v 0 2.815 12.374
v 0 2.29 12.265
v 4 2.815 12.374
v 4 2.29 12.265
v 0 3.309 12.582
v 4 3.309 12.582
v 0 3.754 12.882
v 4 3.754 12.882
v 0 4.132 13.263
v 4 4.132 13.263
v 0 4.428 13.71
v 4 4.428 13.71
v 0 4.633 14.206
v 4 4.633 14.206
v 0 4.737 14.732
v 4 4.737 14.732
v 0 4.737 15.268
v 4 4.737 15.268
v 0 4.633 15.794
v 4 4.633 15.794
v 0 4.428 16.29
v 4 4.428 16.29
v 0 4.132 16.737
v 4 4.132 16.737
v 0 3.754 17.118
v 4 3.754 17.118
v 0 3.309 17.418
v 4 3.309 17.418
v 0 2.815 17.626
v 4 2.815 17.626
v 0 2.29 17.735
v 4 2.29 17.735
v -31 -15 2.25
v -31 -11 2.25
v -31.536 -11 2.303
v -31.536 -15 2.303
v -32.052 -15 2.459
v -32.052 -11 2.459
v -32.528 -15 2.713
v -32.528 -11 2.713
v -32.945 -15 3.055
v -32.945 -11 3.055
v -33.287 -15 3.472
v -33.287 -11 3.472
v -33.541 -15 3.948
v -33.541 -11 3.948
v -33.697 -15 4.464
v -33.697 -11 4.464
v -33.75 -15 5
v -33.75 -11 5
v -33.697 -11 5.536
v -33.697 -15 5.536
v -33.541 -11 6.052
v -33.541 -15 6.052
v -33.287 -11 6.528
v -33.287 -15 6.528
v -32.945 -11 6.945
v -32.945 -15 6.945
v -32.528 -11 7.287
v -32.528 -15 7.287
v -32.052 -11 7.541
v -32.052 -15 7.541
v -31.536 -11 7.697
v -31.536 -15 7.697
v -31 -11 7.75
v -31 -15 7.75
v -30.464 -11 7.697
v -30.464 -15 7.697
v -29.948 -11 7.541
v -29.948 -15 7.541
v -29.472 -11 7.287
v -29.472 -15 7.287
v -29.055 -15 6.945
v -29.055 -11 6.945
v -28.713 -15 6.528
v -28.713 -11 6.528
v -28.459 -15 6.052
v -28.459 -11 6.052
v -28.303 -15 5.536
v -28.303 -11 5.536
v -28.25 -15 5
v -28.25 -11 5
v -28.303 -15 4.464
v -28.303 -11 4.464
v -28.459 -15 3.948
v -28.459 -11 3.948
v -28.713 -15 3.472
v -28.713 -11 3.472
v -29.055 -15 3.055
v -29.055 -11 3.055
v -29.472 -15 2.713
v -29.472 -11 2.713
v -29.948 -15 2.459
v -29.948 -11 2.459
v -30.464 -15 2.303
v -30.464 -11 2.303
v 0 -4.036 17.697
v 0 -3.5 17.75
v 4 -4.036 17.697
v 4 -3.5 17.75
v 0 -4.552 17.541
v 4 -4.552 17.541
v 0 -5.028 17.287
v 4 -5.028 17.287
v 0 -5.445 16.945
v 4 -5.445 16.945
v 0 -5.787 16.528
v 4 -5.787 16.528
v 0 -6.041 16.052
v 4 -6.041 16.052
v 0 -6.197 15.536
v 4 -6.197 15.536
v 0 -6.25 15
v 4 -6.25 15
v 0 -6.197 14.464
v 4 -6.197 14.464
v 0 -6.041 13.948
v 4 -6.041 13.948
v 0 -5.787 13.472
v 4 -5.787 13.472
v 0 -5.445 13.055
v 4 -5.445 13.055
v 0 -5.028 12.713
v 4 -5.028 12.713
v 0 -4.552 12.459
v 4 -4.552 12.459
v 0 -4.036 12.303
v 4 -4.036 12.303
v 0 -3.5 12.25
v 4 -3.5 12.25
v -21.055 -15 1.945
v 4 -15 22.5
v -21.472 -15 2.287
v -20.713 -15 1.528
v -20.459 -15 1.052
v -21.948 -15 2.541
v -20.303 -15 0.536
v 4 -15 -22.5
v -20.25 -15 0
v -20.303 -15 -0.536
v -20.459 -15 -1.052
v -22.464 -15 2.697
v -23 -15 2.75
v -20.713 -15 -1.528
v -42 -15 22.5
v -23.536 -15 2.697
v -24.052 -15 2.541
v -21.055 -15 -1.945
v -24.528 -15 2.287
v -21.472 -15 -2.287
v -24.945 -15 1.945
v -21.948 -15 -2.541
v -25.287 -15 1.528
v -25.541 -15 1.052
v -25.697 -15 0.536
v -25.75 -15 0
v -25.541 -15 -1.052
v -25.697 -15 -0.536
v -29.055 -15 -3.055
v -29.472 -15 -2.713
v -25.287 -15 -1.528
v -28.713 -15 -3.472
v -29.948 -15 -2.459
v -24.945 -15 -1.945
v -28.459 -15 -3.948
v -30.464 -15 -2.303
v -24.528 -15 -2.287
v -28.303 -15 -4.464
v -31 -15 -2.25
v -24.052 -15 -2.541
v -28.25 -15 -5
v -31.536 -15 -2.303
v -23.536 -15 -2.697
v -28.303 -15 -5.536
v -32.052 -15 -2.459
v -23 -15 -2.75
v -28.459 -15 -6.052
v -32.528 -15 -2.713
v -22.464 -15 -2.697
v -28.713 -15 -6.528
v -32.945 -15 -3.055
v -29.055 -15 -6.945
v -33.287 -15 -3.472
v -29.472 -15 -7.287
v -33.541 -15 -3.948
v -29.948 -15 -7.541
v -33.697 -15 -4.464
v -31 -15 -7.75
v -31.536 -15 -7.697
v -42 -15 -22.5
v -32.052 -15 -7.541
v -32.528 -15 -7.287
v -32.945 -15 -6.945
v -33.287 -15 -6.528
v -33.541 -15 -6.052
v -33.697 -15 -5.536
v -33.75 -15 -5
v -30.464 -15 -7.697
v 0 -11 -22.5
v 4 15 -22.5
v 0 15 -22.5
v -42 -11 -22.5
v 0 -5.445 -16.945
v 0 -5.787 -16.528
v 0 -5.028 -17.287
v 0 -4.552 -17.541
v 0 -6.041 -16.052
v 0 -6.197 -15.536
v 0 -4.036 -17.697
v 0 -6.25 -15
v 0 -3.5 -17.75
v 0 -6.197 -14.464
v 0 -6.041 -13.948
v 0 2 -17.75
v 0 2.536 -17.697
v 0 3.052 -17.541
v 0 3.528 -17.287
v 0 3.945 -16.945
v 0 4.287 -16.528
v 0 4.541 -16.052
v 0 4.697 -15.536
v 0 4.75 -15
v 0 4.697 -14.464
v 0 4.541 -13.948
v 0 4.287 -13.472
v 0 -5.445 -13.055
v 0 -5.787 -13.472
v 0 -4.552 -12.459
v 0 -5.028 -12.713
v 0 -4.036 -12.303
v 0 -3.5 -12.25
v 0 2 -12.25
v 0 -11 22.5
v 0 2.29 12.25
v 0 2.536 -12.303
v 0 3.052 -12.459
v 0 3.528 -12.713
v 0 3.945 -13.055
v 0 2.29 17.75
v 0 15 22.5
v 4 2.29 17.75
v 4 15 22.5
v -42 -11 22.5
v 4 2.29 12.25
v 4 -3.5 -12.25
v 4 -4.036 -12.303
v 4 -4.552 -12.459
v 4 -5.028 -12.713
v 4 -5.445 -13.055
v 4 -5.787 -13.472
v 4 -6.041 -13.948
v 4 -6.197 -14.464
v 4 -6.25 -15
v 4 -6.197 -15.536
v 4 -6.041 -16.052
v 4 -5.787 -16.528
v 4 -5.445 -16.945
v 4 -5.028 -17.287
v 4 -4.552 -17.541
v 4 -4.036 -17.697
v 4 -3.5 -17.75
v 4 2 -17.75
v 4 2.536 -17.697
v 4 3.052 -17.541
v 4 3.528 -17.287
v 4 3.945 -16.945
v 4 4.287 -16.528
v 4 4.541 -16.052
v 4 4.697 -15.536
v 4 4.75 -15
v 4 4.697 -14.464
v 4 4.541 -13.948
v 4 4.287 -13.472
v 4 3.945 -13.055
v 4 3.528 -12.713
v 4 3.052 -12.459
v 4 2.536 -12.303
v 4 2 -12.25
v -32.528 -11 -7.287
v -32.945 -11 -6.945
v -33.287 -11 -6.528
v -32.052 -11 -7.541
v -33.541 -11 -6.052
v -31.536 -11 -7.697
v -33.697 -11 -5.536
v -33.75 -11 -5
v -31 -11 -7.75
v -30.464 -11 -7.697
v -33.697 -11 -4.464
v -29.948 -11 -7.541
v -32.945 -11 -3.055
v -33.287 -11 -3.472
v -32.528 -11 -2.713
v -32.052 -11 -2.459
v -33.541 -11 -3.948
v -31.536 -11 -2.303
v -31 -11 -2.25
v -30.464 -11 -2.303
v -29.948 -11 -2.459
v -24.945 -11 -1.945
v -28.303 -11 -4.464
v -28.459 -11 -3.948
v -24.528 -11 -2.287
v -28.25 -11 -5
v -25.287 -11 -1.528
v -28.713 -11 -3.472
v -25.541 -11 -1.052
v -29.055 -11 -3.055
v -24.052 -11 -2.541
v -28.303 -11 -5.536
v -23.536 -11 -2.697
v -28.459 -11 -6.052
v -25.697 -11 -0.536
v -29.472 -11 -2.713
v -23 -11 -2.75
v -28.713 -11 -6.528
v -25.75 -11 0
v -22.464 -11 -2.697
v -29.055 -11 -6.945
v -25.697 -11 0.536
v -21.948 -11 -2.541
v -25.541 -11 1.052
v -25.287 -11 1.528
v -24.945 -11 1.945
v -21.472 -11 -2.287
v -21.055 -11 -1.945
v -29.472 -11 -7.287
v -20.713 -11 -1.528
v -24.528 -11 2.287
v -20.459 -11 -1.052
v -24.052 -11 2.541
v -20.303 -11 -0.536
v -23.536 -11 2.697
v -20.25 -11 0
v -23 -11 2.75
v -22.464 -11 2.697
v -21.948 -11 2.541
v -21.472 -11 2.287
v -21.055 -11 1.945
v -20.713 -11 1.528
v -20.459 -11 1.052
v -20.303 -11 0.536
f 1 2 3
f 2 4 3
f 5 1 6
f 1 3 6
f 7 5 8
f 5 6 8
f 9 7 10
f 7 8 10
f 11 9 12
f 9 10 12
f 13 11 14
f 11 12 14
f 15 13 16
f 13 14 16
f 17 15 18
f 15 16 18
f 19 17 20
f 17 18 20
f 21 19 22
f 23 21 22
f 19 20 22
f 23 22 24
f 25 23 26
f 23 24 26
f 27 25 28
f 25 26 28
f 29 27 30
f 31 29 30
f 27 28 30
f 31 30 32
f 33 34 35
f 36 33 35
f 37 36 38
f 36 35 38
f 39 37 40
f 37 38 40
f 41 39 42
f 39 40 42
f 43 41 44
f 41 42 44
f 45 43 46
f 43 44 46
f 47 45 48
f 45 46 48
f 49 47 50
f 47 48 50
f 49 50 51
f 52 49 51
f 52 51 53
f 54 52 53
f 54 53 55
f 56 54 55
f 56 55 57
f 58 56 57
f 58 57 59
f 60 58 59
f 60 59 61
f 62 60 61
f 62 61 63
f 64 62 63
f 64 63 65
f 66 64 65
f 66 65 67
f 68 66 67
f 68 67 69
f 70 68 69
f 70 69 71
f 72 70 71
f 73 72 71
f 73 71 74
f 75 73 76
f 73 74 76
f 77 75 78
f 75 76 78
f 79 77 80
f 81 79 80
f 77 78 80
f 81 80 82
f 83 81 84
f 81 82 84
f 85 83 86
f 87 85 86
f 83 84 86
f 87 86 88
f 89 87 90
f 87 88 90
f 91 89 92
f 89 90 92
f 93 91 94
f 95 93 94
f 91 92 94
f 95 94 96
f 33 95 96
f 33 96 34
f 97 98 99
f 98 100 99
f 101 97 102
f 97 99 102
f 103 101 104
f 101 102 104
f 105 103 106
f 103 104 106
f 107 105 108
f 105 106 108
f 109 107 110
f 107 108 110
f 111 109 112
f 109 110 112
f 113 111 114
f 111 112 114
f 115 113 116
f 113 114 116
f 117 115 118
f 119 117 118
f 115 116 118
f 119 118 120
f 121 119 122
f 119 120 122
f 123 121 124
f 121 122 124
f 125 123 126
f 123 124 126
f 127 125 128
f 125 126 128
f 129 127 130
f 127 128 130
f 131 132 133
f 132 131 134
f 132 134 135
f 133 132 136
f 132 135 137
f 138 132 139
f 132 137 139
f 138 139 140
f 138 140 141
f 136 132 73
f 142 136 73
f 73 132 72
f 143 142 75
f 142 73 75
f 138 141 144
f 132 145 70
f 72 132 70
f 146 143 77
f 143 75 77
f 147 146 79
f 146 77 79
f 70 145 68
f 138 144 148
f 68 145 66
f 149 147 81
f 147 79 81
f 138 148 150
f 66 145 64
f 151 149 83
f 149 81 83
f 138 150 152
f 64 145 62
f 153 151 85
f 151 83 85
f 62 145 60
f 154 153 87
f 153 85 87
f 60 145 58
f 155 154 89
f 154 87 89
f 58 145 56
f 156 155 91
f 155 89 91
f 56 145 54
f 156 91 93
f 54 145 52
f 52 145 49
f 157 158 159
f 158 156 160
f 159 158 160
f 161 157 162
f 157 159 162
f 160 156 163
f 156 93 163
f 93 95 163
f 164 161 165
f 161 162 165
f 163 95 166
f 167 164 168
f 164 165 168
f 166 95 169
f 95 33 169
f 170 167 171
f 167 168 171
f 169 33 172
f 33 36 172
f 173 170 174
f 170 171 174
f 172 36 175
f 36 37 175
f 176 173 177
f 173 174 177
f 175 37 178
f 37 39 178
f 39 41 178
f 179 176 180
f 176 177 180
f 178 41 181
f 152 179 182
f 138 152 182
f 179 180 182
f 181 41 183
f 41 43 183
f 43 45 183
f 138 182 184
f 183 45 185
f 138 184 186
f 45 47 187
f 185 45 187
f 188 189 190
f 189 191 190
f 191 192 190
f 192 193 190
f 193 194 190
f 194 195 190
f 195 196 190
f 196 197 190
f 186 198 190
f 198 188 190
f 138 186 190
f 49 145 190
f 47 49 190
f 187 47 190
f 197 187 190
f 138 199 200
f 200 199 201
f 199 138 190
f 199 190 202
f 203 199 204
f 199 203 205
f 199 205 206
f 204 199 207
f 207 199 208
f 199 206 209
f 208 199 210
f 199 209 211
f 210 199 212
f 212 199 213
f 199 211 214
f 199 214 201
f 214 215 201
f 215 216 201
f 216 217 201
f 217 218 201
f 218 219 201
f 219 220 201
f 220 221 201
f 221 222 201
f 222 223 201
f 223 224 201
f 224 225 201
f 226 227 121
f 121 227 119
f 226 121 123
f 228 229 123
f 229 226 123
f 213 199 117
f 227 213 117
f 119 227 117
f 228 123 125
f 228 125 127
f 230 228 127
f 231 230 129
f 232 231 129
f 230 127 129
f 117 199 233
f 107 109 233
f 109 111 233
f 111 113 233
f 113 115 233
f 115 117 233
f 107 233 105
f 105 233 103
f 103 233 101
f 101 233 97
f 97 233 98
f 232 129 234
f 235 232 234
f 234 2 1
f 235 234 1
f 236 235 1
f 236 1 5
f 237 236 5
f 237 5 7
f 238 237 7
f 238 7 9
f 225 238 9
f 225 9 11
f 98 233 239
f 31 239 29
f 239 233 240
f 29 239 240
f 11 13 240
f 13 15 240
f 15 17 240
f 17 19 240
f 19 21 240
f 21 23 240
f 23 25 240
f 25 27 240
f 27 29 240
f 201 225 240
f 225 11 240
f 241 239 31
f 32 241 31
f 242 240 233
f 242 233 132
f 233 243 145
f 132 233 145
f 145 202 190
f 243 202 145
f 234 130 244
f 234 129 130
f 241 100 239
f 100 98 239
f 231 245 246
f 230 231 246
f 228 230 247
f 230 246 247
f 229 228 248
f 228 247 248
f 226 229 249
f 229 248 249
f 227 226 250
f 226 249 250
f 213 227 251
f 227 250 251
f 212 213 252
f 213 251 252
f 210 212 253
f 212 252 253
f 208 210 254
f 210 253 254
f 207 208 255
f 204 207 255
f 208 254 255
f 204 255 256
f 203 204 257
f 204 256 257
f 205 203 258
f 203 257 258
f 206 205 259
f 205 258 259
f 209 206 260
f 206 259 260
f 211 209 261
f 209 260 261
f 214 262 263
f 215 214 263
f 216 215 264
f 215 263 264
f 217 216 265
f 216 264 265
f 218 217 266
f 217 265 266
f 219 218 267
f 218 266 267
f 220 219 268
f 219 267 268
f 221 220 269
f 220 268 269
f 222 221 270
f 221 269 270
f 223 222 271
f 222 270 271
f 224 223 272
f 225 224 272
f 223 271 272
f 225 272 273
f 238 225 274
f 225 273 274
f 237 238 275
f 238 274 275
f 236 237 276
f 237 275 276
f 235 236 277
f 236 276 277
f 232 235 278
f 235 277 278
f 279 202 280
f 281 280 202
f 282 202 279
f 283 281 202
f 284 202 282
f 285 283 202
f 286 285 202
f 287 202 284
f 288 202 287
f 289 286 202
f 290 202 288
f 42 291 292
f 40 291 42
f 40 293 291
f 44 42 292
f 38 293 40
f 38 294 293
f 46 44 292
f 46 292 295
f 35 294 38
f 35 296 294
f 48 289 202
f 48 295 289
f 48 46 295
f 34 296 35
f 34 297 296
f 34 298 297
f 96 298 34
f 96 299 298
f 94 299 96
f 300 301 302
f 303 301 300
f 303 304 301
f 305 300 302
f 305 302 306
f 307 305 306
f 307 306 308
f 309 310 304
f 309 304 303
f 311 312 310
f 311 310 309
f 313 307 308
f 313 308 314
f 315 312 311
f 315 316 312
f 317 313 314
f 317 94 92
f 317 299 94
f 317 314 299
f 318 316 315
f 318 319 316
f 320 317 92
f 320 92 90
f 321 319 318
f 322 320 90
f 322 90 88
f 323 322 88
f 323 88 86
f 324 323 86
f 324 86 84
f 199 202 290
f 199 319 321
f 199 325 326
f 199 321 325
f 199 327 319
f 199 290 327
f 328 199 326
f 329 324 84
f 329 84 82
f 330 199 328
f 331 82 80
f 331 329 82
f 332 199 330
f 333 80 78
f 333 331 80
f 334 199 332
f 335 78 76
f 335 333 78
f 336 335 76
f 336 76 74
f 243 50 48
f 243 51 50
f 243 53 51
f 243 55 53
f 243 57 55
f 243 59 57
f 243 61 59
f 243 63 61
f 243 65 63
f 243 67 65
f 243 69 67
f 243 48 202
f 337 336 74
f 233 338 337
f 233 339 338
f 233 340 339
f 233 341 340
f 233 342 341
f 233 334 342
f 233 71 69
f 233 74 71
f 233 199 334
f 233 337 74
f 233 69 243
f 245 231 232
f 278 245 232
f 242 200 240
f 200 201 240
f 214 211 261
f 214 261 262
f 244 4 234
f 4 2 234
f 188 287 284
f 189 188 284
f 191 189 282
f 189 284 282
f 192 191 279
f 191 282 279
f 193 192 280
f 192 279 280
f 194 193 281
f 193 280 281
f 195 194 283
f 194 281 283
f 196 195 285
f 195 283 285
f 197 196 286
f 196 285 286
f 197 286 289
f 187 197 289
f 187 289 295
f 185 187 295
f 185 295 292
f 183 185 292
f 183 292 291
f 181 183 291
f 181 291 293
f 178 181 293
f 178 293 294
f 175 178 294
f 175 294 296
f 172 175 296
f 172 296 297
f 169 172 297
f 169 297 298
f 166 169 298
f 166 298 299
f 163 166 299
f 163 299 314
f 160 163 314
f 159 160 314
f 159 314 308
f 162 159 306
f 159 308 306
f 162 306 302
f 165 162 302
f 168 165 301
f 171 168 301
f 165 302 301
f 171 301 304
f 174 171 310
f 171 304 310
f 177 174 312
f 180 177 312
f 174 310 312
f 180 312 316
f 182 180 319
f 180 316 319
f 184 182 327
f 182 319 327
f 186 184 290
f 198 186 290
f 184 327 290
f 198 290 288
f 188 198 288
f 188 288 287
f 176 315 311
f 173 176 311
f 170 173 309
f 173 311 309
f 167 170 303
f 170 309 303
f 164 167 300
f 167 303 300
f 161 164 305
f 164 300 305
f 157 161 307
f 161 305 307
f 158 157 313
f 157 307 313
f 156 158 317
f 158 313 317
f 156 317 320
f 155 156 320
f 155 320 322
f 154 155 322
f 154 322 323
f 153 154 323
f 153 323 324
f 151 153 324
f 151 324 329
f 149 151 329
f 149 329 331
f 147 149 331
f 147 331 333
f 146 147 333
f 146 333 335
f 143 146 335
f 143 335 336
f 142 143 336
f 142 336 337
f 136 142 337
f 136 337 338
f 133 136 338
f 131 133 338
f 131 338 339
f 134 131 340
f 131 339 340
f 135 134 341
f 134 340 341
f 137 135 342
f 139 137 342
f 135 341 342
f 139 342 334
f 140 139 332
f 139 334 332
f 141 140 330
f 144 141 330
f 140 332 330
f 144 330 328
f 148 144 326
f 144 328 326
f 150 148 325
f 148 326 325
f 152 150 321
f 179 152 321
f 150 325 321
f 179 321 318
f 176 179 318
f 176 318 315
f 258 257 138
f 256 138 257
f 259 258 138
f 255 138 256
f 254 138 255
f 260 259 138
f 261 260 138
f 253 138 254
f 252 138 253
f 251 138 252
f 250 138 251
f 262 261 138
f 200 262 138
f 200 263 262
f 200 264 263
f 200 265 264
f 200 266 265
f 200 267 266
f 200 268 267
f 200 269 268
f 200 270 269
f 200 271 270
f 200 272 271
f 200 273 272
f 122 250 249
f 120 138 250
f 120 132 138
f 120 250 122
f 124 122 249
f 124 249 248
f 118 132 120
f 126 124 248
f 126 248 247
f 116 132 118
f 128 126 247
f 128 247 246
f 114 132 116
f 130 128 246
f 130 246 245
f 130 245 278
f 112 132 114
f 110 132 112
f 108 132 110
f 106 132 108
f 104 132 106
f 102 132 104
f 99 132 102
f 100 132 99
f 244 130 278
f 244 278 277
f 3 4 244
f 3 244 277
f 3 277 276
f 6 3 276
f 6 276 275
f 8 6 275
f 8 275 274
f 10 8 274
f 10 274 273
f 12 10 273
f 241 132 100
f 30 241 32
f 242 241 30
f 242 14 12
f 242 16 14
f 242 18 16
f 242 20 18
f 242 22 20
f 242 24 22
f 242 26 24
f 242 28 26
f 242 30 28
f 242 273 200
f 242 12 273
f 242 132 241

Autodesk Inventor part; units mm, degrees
ref_plane "YZ Plane" through (0, 0, 0) normal (1, 0, 0) x (0, 1, 0)
ref_plane "XZ Plane" through (0, 0, 0) normal (0, 1, 0) x (-1, 0, 0)
ref_plane "XY Plane" through (0, 0, 0) normal (0, 0, 1) x (1, 0, 0)
sketch "Skizze1" plane through (0, 0, 0) normal (1, 0, 0) x (0, 1, 0)
  line L0 (15, 22.5) -> (-15, 22.5)
  line L1 (-15, 22.5) -> (-15, -22.5)
  line L2 (-15, -22.5) -> (15, -22.5)
  line L3 (15, -22.5) -> (15, 22.5)
  line L4 (15, 22.5) -> (-15, -22.5) construction
  line L5 (-15, 22.5) -> (15, -22.5) construction
  point P0 (0, 0)
  dimension "d0" = 30
  dimension "d1" = 45
extrude "Extrusion1" add sketch "Skizze1" along normal blind 4
sketch "Skizze2" plane through (0, 0, 0) normal (-1, 0, 0) x (0, 0, 1)
  line L0 (-22.5, -15) -> (-22.5, 15) projected
  line L1 (-22.5, -11) -> (22.5, -11)
  line L2 (22.5, -11) -> (22.5, -15)
  line L3 (22.5, -15) -> (-22.5, -15)
  line L4 (-22.5, -15) -> (-22.5, -11)
  line L5 (22.5, -15) -> (-22.5, -15) projected
  point P0 (0, 0)
  dimension "d4" = 4
  dimension "d5" = 0
extrude "Extrusion2" add sketch "Skizze2" along normal blind 42
sketch "Skizze3" plane through (4, -15, -22.5) normal (0, -1, 0) x (1, 0, 0)
  line L0 (0, 22.5) -> (-45.8958, 22.5)
  line L1 (0, 45) -> (0, 0) projected
  line L2 (-46, 0) -> (-46, 45) projected
  point P0 (-4, 22.5)
  point P1 (-27, 22.5)
  point P2 (-35, 17.5)
  point P3 (-35, 27.5)
  point P4 (-46, 22.5)
  dimension "d15" = 27
  dimension "d17" = 10
  dimension "d18" = 35
  dimension "d19" = 0
  dimension "d21" = 5
hole "Bohrung1" at (-23, -15, 0) at (-31, -15, -5) at (-31, -15, 5) direction (0, 1, 0) diameter 5.5 depth 11.8 tip angle 118
sketch "Skizze5" plane through (0, 0, 0) normal (-1, 0, 0) x (0, 0, 1)
  line L0 (-22.5, -15) -> (22.5, -15) projected
  point P0 (0, 0)
  point P1 (15, -3.5)
  point P2 (-15, -3.5)
  point P3 (15, 2)
  point P4 (-15, 2)
  dimension "d29" = 30
  dimension "d30" = 15
  dimension "d31" = 11.5
  dimension "d32" = 11.5
  dimension "d33" = 15
  dimension "d34" = 30
  dimension "d35" = 5.5
  dimension "d36" = 5.5
hole "Bohrung2" at (0, -3.5, 15) at (0, -3.5, -15) at (0, 2, 15) at (0, 2, -15) direction (1, 0, 0) diameter 5.5 depth 11.8 tip angle 118
sketch "Skizze6" plane through (0, 0, 0) normal (-1, 0, 0) x (0, 0, 1)
  circle A0 centre (15, -3.5) radius 2.75 projected
  line L0 (17.75, -3.5) -> (17.75, 2.2896)
  line L1 (12.25, -3.5) -> (12.25, 2.2896)
  circle A1 centre (-15, -3.5) radius 2.75 projected
  line L2 (-12.25, -3.5) -> (-12.25, 2.2896)
  line L3 (-17.75, -3.5) -> (-17.75, 2)
  circle A2 centre (-15, 2) radius 2.75 projected
  line L4 (17.75, -3.5) -> (12.25, -3.5)
  line L5 (17.75, 2.2896) -> (12.25, 2.2896)
  line L6 (-12.25, -3.5) -> (-17.75, -3.5)
  line L7 (-12.25, 2.2896) -> (-17.7347, 2.2896)
  circle A3 centre (-15, 2) radius 2.75 projected
  point P0 (0, 0)
  point P1 (15, -0.75)
  point P2 (-15, -0.75)
  point P3 (-12.25, 2)
extrude "Extrusion3" cut sketch "Skizze6" against normal blind 6 contours A0 L1 L5 L0 | L3 A2 A1 | A1 A2 L2
properties part number "Montagewinkel für Spannelement"
